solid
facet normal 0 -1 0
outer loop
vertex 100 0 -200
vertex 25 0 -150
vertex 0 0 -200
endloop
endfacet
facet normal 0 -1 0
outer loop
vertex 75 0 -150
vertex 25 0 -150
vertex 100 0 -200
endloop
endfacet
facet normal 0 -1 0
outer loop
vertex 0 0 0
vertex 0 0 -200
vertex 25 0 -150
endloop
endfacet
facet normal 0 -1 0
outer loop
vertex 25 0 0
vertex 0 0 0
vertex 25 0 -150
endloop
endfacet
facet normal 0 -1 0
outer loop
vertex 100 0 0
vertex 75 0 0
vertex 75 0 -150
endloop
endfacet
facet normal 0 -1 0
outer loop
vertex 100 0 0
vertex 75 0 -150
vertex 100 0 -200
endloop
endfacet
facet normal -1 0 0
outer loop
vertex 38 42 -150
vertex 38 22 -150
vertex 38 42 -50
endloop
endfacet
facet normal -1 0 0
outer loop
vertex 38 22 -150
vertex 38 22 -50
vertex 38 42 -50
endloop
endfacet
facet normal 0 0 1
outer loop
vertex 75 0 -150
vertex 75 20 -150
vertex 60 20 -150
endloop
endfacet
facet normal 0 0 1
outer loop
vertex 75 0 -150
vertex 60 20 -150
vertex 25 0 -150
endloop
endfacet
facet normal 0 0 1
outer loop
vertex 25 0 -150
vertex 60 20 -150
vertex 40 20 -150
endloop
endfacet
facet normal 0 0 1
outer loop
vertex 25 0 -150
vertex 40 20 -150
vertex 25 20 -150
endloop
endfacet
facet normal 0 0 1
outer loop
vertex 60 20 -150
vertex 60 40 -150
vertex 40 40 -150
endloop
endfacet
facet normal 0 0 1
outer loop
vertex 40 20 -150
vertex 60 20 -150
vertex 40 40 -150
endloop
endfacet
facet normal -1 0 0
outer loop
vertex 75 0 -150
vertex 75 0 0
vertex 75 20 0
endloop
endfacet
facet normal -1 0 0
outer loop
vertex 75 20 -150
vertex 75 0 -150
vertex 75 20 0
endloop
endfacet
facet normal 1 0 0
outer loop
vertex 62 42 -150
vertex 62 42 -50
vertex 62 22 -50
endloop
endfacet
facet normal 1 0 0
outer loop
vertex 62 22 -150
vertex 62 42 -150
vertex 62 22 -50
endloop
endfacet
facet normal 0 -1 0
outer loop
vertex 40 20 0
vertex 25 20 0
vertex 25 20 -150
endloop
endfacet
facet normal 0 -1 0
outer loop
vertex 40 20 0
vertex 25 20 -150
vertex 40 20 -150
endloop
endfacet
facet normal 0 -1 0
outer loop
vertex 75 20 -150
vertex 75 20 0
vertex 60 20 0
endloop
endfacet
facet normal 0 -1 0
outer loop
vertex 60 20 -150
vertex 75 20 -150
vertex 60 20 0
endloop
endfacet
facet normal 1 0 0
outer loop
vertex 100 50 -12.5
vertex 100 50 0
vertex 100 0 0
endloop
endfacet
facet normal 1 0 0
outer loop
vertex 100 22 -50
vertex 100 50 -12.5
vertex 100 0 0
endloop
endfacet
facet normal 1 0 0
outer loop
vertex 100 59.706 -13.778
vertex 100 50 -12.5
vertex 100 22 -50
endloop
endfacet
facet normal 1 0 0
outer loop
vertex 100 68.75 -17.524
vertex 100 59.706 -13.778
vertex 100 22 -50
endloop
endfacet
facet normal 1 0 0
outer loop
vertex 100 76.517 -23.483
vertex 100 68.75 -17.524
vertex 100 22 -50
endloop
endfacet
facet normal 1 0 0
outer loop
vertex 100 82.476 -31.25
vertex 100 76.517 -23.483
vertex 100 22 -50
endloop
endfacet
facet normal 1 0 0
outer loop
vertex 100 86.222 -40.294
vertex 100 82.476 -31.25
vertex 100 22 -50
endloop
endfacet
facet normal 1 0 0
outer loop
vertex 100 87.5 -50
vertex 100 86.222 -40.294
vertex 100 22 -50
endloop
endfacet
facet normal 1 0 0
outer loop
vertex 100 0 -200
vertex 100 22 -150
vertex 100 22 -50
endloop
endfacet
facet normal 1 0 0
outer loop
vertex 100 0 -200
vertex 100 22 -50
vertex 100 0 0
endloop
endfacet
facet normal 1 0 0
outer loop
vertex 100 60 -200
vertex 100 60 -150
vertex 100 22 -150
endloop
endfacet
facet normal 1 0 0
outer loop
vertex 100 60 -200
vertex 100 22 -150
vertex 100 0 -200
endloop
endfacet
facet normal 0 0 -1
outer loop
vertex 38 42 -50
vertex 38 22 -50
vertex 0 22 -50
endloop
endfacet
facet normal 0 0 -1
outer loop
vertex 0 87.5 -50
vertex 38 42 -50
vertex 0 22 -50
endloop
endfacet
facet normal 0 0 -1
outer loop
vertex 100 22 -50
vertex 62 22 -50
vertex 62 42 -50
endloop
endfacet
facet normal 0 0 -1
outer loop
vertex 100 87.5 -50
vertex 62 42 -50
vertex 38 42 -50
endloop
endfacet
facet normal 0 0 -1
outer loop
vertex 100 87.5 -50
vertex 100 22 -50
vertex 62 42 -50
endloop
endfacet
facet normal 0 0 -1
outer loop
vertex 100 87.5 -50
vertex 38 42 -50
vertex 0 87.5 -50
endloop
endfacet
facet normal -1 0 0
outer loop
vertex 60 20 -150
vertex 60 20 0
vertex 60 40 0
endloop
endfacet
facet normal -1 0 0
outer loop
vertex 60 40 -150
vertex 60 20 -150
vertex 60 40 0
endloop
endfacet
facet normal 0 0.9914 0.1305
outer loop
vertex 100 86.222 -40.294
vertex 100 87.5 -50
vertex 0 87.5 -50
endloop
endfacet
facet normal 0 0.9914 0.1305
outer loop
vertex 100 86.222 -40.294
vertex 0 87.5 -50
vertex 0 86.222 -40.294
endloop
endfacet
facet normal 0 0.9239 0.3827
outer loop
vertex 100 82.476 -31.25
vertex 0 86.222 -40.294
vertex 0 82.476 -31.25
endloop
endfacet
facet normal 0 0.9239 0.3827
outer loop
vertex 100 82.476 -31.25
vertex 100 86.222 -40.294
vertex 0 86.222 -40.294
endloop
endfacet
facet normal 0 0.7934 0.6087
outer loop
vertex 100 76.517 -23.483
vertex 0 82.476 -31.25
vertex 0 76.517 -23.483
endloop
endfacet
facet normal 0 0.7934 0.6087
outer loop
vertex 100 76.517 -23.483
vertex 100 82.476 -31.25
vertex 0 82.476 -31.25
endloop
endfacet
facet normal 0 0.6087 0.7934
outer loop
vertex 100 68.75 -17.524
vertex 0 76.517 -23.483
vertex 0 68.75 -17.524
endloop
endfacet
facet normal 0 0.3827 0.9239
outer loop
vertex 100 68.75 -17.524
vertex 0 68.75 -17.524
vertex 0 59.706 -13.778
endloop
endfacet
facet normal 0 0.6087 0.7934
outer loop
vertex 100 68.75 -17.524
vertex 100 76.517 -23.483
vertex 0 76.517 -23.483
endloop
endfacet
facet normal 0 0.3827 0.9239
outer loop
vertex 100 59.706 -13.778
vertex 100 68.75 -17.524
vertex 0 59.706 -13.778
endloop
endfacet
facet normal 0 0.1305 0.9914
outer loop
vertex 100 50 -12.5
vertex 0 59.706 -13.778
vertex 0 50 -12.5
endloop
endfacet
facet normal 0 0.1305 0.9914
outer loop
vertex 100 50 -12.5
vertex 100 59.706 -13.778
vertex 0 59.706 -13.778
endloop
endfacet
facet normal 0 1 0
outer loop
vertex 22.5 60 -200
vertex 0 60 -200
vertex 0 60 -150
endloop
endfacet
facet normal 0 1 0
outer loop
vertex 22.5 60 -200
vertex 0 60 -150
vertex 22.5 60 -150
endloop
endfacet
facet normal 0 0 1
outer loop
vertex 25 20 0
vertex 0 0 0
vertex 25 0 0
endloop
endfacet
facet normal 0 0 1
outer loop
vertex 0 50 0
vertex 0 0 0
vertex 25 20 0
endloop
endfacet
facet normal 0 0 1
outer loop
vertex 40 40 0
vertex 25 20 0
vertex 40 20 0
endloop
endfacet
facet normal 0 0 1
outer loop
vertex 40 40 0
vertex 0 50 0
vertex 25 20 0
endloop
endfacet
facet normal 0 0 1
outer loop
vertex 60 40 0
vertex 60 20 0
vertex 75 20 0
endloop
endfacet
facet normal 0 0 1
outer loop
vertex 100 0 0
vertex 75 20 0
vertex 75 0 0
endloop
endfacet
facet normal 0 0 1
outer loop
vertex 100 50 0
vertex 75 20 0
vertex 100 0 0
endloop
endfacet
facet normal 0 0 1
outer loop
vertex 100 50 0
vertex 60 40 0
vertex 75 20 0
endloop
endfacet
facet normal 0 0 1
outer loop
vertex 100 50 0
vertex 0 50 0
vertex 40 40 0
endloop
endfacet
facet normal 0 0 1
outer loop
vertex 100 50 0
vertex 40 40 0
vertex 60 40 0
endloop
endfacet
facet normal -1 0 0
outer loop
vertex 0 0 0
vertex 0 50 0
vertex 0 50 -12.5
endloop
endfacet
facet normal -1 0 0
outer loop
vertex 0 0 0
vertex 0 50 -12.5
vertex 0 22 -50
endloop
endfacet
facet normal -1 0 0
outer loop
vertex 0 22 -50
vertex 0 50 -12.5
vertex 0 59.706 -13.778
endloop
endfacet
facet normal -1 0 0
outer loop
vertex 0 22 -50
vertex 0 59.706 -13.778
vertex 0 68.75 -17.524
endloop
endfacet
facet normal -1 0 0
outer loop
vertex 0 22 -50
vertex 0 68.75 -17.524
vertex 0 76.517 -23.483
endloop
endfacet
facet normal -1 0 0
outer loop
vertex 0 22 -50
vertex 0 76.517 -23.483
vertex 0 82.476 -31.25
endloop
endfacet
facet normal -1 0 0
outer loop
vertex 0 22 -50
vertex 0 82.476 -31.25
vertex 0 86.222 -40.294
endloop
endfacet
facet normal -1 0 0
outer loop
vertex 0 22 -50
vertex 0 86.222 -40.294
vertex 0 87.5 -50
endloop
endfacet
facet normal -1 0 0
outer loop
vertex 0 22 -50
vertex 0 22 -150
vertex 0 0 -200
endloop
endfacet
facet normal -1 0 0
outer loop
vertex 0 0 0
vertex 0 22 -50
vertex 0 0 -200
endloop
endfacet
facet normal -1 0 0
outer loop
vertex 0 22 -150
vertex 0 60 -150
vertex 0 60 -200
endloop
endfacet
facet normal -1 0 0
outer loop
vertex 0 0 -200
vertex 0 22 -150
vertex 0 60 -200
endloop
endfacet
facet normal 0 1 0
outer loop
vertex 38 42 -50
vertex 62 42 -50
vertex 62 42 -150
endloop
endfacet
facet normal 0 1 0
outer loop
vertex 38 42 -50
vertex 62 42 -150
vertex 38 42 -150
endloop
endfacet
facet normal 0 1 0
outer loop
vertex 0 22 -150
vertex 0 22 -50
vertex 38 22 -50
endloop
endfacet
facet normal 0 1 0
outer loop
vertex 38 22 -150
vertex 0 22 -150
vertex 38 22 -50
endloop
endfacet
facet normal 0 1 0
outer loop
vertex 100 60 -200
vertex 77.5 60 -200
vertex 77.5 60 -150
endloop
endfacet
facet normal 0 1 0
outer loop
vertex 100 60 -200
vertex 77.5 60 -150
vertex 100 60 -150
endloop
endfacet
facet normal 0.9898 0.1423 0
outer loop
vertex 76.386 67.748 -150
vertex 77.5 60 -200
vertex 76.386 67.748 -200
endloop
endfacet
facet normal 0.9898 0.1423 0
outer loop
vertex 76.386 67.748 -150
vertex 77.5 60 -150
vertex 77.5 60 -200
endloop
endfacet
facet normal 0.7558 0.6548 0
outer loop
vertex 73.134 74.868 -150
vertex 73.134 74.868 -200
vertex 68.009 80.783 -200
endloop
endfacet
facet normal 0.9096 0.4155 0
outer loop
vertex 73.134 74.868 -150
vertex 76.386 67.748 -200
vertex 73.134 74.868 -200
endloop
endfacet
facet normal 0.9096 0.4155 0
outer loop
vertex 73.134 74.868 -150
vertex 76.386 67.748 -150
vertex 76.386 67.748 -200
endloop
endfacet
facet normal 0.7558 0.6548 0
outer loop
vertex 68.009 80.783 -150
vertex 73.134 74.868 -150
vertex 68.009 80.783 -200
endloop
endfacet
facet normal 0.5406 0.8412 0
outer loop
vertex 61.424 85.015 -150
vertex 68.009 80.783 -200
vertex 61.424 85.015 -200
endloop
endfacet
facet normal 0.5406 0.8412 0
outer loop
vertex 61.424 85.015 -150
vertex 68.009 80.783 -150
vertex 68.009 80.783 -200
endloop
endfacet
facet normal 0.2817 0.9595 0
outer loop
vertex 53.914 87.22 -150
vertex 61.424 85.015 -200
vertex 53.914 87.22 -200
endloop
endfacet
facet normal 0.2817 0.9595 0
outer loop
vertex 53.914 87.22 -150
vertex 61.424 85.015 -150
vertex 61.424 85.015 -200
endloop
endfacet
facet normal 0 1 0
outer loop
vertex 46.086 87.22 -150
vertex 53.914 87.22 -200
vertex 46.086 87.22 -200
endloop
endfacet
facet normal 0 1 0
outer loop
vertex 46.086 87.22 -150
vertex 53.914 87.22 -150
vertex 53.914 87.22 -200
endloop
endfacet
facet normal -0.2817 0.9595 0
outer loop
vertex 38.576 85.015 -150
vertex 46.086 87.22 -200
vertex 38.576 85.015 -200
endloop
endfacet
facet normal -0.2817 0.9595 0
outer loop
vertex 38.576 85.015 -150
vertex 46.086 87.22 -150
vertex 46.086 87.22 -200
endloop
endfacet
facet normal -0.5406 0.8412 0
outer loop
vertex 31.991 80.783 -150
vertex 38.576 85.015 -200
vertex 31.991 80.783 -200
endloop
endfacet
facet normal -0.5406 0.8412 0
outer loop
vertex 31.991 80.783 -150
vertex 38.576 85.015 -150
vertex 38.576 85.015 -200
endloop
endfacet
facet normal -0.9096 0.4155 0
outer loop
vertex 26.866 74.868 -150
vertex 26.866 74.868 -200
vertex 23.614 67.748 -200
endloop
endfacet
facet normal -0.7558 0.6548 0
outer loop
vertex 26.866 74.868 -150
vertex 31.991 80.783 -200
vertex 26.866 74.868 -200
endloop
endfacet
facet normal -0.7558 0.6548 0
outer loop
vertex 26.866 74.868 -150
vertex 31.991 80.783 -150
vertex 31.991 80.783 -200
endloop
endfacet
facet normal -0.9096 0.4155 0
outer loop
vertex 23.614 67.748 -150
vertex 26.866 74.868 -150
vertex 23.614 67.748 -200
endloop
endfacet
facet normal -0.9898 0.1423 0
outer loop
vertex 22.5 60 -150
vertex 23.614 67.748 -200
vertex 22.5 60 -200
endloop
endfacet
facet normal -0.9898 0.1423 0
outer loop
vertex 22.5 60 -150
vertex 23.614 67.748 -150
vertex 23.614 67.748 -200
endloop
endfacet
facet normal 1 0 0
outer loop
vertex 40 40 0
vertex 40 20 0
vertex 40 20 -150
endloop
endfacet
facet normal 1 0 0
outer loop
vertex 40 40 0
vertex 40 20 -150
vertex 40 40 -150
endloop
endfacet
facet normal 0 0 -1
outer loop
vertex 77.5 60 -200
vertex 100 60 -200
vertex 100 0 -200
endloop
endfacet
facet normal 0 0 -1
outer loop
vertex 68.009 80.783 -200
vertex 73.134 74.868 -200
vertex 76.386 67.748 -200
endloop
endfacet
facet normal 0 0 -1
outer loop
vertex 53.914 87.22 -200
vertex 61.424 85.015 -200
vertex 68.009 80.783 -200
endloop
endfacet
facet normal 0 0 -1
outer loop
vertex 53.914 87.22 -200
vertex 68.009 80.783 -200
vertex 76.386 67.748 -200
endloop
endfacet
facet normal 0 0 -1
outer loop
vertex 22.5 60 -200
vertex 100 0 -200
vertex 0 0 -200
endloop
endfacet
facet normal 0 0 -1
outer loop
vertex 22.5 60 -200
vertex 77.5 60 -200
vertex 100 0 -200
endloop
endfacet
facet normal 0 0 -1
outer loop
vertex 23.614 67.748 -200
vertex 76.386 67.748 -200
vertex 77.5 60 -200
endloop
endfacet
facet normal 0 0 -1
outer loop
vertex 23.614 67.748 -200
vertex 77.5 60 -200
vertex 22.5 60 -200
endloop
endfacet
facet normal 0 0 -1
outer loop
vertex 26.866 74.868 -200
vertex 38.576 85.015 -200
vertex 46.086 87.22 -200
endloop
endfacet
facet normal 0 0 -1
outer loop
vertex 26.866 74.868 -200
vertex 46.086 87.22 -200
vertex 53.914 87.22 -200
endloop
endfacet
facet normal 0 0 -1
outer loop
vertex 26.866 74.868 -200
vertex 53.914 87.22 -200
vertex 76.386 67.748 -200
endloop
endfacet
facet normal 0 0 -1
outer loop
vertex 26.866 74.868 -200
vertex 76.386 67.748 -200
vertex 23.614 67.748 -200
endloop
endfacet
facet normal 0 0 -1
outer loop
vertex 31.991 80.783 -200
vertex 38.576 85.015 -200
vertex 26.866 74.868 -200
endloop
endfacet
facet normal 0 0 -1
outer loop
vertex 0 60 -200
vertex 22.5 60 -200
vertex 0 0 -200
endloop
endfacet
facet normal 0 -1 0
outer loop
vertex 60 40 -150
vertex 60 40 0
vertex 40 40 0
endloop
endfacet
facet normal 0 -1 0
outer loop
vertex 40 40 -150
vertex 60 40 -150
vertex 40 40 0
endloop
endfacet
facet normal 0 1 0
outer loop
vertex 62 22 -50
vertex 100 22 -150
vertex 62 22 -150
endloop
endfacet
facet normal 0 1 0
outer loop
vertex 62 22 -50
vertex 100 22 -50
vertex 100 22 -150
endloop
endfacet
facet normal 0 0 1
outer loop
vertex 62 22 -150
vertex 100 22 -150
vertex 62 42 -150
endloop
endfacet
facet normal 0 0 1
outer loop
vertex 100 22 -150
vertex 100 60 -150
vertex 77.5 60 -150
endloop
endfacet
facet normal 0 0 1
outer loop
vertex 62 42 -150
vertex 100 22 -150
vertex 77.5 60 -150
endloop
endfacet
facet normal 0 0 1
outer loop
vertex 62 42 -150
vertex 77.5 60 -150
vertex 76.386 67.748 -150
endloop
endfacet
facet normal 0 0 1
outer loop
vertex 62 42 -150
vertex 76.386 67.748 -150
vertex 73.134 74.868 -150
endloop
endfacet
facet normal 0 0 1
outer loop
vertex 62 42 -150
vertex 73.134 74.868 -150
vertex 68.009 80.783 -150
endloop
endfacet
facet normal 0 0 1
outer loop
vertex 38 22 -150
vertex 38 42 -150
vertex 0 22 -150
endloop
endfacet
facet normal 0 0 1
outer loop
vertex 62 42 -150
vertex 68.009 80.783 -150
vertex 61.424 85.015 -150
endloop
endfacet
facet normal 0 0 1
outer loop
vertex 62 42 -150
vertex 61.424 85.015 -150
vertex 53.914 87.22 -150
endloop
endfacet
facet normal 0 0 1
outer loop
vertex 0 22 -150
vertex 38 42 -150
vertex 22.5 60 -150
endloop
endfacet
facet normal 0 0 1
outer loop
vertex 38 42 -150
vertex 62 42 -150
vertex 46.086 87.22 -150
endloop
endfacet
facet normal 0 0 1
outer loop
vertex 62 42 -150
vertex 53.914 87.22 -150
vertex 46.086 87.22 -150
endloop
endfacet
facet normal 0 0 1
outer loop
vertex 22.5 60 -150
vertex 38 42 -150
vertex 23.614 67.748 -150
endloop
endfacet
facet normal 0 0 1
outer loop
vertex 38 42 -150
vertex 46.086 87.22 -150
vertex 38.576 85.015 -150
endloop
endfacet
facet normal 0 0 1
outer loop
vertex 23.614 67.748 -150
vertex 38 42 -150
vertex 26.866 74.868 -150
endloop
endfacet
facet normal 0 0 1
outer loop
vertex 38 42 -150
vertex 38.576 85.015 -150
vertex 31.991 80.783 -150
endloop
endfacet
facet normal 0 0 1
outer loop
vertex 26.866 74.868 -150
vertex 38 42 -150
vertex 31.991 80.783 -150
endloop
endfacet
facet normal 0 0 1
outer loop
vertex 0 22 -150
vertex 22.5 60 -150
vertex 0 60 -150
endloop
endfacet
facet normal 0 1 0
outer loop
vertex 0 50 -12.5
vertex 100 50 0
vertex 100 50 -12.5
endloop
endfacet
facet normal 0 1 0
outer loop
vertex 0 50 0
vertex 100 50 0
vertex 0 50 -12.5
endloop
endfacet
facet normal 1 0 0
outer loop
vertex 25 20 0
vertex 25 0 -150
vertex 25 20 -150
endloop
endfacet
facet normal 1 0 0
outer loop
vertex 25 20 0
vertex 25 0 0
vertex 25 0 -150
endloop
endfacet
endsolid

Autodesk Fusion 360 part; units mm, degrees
sketch "Sketch1" plane through (0, 0, 0) normal (0, 0, 1) x (1, 0, 0)
  line L0 (0, 0) -> (100, 0)
  line L1 (100, 0) -> (100, 50)
  line L2 (100, 50) -> (0, 50)
  line L3 (0, 50) -> (0, 0)
  line L4 (0, 0) -> (25, 0)
  line L5 (25, 0) -> (25, 20)
  line L6 (25, 20) -> (40, 20)
  line L7 (40, 20) -> (40, 40)
  line L8 (40, 40) -> (50, 40)
  line L9 (0, 50) -> (100, 50)
  line L10 (75, 20) -> (60, 20)
  line L11 (60, 20) -> (60, 40)
  line L12 (60, 40) -> (50, 40)
  line L13 (75, 0) -> (75, 20)
  dimension "d1" = 100
  dimension "d2" = 50
  dimension "d3" = 25
  dimension "d4" = 20
  dimension "d5" = 90
  dimension "d6" = 15
  dimension "d7" = 20
extrude "Extrude1" add sketch "Sketch1" against normal blind 50 contours L0 L1 L2 L3 L4 L5 L6 L7 L8 L9 L10 L11 L12 L13
sketch "Sketch2" plane through (0, 0, -50) normal (0, 0, -1) x (-1, 0, 0)
  line L0 (-100, 50) -> (-100, 0)
  line L1 (-100, 0) -> (-75, 0)
  line L2 (-75, 0) -> (-75, 20)
  line L3 (-75, 20) -> (-60, 20)
  line L4 (-60, 20) -> (-60, 40)
  line L5 (-60, 40) -> (-40, 40)
  line L6 (-40, 40) -> (-40, 20)
  line L7 (-40, 20) -> (-25, 20)
  line L8 (-25, 20) -> (-25, 0)
  line L9 (-25, 0) -> (0, 0)
  line L10 (0, 0) -> (0, 50)
  line L11 (0, 50) -> (-100, 50)
  line L12 (-75, 20) -> (-25, 20)
  line L13 (0, 0) -> (-100, 0)
  line L14 (-100, 20) -> (-100, 0)
  line L15 (0, 20) -> (0, 0)
  line L16 (-100, 20) -> (-100, 22)
  line L17 (-100, 22) -> (-62, 22)
  line L18 (-62, 40) -> (-62, 22)
  line L19 (-62, 40) -> (-62, 42)
  line L20 (-62, 42) -> (-40, 42)
  line L21 (-50, 20) -> (-50, 22)
  line L22 (-38, 40) -> (-38, 22)
  line L23 (-38, 42) -> (-60, 42)
  line L24 (-38, 40) -> (-38, 42)
  line L25 (0, 22) -> (-38, 22)
  dimension "d10" = 2
  dimension "d11" = 2
  dimension "d12" = 2
extrude "Extrude2" add sketch "Sketch2" along normal blind 100 contours L0 L1 L2 L3 L4 L5 L6 L7 L8 L9 L10 L12 L13 L14 L15 L16 L17 L18 L19 L20 L22 L23 L24 L25
sketch "Sketch3" plane through (0, 0, -150) normal (0, 0, -1) x (-1, 0, 0)
  line L0 (0, 0) -> (0, 22)
  line L1 (0, 22) -> (-38, 22)
  line L2 (-38, 22) -> (-38, 42)
  line L3 (-38, 42) -> (-62, 42)
  line L4 (-62, 42) -> (-62, 22)
  line L5 (-62, 22) -> (-100, 22)
  line L6 (-100, 22) -> (-100, 0)
  line L7 (-100, 0) -> (-75, 0)
  line L8 (-75, 0) -> (-75, 20)
  line L9 (-75, 20) -> (-60, 20)
  line L10 (-60, 20) -> (-60, 40)
  line L11 (-60, 40) -> (-40, 40)
  line L12 (-40, 40) -> (-40, 20)
  line L13 (-40, 20) -> (-25, 20)
  line L14 (-25, 20) -> (-25, 0)
  line L15 (-25, 0) -> (0, 0)
  line L16 (-100, 0) -> (0, 0)
  line L17 (0, 0) -> (0, 60)
  line L18 (-100, 60) -> (-100, 0)
  arc A0 (-22.5, 60) -> (-77.5, 60) centre (-50, 60) ccw
  line L19 (0, 60) -> (-22.5, 60)
  line L20 (-77.5, 60) -> (-100, 60)
  dimension "d15" = 60
extrude "Extrude3" add sketch "Sketch3" along normal blind 50
sketch "Sketch4" plane through (100, 0, 0) normal (1, 0, 0) x (0, 0, -1)
  line L0 (0, 50) -> (0, 0)
  line L1 (0, 0) -> (200, 0)
  line L2 (200, 0) -> (200, 60)
  line L3 (200, 60) -> (150, 60)
  line L4 (150, 60) -> (150, 22)
  line L5 (150, 22) -> (50, 22)
  line L6 (50, 22) -> (50, 50)
  line L7 (50, 50) -> (0, 50)
  line L8 (50, 50) -> (50, 87.5)
  line L9 (12.5, 50) -> (50, 50)
  arc A0 (50, 87.5) -> (12.5, 50) centre (50, 50) ccw
  dimension "d19" = 75
extrude "Extrude4" add sketch "Sketch4" against normal blind 100 contours L7 L8 L9 A0
